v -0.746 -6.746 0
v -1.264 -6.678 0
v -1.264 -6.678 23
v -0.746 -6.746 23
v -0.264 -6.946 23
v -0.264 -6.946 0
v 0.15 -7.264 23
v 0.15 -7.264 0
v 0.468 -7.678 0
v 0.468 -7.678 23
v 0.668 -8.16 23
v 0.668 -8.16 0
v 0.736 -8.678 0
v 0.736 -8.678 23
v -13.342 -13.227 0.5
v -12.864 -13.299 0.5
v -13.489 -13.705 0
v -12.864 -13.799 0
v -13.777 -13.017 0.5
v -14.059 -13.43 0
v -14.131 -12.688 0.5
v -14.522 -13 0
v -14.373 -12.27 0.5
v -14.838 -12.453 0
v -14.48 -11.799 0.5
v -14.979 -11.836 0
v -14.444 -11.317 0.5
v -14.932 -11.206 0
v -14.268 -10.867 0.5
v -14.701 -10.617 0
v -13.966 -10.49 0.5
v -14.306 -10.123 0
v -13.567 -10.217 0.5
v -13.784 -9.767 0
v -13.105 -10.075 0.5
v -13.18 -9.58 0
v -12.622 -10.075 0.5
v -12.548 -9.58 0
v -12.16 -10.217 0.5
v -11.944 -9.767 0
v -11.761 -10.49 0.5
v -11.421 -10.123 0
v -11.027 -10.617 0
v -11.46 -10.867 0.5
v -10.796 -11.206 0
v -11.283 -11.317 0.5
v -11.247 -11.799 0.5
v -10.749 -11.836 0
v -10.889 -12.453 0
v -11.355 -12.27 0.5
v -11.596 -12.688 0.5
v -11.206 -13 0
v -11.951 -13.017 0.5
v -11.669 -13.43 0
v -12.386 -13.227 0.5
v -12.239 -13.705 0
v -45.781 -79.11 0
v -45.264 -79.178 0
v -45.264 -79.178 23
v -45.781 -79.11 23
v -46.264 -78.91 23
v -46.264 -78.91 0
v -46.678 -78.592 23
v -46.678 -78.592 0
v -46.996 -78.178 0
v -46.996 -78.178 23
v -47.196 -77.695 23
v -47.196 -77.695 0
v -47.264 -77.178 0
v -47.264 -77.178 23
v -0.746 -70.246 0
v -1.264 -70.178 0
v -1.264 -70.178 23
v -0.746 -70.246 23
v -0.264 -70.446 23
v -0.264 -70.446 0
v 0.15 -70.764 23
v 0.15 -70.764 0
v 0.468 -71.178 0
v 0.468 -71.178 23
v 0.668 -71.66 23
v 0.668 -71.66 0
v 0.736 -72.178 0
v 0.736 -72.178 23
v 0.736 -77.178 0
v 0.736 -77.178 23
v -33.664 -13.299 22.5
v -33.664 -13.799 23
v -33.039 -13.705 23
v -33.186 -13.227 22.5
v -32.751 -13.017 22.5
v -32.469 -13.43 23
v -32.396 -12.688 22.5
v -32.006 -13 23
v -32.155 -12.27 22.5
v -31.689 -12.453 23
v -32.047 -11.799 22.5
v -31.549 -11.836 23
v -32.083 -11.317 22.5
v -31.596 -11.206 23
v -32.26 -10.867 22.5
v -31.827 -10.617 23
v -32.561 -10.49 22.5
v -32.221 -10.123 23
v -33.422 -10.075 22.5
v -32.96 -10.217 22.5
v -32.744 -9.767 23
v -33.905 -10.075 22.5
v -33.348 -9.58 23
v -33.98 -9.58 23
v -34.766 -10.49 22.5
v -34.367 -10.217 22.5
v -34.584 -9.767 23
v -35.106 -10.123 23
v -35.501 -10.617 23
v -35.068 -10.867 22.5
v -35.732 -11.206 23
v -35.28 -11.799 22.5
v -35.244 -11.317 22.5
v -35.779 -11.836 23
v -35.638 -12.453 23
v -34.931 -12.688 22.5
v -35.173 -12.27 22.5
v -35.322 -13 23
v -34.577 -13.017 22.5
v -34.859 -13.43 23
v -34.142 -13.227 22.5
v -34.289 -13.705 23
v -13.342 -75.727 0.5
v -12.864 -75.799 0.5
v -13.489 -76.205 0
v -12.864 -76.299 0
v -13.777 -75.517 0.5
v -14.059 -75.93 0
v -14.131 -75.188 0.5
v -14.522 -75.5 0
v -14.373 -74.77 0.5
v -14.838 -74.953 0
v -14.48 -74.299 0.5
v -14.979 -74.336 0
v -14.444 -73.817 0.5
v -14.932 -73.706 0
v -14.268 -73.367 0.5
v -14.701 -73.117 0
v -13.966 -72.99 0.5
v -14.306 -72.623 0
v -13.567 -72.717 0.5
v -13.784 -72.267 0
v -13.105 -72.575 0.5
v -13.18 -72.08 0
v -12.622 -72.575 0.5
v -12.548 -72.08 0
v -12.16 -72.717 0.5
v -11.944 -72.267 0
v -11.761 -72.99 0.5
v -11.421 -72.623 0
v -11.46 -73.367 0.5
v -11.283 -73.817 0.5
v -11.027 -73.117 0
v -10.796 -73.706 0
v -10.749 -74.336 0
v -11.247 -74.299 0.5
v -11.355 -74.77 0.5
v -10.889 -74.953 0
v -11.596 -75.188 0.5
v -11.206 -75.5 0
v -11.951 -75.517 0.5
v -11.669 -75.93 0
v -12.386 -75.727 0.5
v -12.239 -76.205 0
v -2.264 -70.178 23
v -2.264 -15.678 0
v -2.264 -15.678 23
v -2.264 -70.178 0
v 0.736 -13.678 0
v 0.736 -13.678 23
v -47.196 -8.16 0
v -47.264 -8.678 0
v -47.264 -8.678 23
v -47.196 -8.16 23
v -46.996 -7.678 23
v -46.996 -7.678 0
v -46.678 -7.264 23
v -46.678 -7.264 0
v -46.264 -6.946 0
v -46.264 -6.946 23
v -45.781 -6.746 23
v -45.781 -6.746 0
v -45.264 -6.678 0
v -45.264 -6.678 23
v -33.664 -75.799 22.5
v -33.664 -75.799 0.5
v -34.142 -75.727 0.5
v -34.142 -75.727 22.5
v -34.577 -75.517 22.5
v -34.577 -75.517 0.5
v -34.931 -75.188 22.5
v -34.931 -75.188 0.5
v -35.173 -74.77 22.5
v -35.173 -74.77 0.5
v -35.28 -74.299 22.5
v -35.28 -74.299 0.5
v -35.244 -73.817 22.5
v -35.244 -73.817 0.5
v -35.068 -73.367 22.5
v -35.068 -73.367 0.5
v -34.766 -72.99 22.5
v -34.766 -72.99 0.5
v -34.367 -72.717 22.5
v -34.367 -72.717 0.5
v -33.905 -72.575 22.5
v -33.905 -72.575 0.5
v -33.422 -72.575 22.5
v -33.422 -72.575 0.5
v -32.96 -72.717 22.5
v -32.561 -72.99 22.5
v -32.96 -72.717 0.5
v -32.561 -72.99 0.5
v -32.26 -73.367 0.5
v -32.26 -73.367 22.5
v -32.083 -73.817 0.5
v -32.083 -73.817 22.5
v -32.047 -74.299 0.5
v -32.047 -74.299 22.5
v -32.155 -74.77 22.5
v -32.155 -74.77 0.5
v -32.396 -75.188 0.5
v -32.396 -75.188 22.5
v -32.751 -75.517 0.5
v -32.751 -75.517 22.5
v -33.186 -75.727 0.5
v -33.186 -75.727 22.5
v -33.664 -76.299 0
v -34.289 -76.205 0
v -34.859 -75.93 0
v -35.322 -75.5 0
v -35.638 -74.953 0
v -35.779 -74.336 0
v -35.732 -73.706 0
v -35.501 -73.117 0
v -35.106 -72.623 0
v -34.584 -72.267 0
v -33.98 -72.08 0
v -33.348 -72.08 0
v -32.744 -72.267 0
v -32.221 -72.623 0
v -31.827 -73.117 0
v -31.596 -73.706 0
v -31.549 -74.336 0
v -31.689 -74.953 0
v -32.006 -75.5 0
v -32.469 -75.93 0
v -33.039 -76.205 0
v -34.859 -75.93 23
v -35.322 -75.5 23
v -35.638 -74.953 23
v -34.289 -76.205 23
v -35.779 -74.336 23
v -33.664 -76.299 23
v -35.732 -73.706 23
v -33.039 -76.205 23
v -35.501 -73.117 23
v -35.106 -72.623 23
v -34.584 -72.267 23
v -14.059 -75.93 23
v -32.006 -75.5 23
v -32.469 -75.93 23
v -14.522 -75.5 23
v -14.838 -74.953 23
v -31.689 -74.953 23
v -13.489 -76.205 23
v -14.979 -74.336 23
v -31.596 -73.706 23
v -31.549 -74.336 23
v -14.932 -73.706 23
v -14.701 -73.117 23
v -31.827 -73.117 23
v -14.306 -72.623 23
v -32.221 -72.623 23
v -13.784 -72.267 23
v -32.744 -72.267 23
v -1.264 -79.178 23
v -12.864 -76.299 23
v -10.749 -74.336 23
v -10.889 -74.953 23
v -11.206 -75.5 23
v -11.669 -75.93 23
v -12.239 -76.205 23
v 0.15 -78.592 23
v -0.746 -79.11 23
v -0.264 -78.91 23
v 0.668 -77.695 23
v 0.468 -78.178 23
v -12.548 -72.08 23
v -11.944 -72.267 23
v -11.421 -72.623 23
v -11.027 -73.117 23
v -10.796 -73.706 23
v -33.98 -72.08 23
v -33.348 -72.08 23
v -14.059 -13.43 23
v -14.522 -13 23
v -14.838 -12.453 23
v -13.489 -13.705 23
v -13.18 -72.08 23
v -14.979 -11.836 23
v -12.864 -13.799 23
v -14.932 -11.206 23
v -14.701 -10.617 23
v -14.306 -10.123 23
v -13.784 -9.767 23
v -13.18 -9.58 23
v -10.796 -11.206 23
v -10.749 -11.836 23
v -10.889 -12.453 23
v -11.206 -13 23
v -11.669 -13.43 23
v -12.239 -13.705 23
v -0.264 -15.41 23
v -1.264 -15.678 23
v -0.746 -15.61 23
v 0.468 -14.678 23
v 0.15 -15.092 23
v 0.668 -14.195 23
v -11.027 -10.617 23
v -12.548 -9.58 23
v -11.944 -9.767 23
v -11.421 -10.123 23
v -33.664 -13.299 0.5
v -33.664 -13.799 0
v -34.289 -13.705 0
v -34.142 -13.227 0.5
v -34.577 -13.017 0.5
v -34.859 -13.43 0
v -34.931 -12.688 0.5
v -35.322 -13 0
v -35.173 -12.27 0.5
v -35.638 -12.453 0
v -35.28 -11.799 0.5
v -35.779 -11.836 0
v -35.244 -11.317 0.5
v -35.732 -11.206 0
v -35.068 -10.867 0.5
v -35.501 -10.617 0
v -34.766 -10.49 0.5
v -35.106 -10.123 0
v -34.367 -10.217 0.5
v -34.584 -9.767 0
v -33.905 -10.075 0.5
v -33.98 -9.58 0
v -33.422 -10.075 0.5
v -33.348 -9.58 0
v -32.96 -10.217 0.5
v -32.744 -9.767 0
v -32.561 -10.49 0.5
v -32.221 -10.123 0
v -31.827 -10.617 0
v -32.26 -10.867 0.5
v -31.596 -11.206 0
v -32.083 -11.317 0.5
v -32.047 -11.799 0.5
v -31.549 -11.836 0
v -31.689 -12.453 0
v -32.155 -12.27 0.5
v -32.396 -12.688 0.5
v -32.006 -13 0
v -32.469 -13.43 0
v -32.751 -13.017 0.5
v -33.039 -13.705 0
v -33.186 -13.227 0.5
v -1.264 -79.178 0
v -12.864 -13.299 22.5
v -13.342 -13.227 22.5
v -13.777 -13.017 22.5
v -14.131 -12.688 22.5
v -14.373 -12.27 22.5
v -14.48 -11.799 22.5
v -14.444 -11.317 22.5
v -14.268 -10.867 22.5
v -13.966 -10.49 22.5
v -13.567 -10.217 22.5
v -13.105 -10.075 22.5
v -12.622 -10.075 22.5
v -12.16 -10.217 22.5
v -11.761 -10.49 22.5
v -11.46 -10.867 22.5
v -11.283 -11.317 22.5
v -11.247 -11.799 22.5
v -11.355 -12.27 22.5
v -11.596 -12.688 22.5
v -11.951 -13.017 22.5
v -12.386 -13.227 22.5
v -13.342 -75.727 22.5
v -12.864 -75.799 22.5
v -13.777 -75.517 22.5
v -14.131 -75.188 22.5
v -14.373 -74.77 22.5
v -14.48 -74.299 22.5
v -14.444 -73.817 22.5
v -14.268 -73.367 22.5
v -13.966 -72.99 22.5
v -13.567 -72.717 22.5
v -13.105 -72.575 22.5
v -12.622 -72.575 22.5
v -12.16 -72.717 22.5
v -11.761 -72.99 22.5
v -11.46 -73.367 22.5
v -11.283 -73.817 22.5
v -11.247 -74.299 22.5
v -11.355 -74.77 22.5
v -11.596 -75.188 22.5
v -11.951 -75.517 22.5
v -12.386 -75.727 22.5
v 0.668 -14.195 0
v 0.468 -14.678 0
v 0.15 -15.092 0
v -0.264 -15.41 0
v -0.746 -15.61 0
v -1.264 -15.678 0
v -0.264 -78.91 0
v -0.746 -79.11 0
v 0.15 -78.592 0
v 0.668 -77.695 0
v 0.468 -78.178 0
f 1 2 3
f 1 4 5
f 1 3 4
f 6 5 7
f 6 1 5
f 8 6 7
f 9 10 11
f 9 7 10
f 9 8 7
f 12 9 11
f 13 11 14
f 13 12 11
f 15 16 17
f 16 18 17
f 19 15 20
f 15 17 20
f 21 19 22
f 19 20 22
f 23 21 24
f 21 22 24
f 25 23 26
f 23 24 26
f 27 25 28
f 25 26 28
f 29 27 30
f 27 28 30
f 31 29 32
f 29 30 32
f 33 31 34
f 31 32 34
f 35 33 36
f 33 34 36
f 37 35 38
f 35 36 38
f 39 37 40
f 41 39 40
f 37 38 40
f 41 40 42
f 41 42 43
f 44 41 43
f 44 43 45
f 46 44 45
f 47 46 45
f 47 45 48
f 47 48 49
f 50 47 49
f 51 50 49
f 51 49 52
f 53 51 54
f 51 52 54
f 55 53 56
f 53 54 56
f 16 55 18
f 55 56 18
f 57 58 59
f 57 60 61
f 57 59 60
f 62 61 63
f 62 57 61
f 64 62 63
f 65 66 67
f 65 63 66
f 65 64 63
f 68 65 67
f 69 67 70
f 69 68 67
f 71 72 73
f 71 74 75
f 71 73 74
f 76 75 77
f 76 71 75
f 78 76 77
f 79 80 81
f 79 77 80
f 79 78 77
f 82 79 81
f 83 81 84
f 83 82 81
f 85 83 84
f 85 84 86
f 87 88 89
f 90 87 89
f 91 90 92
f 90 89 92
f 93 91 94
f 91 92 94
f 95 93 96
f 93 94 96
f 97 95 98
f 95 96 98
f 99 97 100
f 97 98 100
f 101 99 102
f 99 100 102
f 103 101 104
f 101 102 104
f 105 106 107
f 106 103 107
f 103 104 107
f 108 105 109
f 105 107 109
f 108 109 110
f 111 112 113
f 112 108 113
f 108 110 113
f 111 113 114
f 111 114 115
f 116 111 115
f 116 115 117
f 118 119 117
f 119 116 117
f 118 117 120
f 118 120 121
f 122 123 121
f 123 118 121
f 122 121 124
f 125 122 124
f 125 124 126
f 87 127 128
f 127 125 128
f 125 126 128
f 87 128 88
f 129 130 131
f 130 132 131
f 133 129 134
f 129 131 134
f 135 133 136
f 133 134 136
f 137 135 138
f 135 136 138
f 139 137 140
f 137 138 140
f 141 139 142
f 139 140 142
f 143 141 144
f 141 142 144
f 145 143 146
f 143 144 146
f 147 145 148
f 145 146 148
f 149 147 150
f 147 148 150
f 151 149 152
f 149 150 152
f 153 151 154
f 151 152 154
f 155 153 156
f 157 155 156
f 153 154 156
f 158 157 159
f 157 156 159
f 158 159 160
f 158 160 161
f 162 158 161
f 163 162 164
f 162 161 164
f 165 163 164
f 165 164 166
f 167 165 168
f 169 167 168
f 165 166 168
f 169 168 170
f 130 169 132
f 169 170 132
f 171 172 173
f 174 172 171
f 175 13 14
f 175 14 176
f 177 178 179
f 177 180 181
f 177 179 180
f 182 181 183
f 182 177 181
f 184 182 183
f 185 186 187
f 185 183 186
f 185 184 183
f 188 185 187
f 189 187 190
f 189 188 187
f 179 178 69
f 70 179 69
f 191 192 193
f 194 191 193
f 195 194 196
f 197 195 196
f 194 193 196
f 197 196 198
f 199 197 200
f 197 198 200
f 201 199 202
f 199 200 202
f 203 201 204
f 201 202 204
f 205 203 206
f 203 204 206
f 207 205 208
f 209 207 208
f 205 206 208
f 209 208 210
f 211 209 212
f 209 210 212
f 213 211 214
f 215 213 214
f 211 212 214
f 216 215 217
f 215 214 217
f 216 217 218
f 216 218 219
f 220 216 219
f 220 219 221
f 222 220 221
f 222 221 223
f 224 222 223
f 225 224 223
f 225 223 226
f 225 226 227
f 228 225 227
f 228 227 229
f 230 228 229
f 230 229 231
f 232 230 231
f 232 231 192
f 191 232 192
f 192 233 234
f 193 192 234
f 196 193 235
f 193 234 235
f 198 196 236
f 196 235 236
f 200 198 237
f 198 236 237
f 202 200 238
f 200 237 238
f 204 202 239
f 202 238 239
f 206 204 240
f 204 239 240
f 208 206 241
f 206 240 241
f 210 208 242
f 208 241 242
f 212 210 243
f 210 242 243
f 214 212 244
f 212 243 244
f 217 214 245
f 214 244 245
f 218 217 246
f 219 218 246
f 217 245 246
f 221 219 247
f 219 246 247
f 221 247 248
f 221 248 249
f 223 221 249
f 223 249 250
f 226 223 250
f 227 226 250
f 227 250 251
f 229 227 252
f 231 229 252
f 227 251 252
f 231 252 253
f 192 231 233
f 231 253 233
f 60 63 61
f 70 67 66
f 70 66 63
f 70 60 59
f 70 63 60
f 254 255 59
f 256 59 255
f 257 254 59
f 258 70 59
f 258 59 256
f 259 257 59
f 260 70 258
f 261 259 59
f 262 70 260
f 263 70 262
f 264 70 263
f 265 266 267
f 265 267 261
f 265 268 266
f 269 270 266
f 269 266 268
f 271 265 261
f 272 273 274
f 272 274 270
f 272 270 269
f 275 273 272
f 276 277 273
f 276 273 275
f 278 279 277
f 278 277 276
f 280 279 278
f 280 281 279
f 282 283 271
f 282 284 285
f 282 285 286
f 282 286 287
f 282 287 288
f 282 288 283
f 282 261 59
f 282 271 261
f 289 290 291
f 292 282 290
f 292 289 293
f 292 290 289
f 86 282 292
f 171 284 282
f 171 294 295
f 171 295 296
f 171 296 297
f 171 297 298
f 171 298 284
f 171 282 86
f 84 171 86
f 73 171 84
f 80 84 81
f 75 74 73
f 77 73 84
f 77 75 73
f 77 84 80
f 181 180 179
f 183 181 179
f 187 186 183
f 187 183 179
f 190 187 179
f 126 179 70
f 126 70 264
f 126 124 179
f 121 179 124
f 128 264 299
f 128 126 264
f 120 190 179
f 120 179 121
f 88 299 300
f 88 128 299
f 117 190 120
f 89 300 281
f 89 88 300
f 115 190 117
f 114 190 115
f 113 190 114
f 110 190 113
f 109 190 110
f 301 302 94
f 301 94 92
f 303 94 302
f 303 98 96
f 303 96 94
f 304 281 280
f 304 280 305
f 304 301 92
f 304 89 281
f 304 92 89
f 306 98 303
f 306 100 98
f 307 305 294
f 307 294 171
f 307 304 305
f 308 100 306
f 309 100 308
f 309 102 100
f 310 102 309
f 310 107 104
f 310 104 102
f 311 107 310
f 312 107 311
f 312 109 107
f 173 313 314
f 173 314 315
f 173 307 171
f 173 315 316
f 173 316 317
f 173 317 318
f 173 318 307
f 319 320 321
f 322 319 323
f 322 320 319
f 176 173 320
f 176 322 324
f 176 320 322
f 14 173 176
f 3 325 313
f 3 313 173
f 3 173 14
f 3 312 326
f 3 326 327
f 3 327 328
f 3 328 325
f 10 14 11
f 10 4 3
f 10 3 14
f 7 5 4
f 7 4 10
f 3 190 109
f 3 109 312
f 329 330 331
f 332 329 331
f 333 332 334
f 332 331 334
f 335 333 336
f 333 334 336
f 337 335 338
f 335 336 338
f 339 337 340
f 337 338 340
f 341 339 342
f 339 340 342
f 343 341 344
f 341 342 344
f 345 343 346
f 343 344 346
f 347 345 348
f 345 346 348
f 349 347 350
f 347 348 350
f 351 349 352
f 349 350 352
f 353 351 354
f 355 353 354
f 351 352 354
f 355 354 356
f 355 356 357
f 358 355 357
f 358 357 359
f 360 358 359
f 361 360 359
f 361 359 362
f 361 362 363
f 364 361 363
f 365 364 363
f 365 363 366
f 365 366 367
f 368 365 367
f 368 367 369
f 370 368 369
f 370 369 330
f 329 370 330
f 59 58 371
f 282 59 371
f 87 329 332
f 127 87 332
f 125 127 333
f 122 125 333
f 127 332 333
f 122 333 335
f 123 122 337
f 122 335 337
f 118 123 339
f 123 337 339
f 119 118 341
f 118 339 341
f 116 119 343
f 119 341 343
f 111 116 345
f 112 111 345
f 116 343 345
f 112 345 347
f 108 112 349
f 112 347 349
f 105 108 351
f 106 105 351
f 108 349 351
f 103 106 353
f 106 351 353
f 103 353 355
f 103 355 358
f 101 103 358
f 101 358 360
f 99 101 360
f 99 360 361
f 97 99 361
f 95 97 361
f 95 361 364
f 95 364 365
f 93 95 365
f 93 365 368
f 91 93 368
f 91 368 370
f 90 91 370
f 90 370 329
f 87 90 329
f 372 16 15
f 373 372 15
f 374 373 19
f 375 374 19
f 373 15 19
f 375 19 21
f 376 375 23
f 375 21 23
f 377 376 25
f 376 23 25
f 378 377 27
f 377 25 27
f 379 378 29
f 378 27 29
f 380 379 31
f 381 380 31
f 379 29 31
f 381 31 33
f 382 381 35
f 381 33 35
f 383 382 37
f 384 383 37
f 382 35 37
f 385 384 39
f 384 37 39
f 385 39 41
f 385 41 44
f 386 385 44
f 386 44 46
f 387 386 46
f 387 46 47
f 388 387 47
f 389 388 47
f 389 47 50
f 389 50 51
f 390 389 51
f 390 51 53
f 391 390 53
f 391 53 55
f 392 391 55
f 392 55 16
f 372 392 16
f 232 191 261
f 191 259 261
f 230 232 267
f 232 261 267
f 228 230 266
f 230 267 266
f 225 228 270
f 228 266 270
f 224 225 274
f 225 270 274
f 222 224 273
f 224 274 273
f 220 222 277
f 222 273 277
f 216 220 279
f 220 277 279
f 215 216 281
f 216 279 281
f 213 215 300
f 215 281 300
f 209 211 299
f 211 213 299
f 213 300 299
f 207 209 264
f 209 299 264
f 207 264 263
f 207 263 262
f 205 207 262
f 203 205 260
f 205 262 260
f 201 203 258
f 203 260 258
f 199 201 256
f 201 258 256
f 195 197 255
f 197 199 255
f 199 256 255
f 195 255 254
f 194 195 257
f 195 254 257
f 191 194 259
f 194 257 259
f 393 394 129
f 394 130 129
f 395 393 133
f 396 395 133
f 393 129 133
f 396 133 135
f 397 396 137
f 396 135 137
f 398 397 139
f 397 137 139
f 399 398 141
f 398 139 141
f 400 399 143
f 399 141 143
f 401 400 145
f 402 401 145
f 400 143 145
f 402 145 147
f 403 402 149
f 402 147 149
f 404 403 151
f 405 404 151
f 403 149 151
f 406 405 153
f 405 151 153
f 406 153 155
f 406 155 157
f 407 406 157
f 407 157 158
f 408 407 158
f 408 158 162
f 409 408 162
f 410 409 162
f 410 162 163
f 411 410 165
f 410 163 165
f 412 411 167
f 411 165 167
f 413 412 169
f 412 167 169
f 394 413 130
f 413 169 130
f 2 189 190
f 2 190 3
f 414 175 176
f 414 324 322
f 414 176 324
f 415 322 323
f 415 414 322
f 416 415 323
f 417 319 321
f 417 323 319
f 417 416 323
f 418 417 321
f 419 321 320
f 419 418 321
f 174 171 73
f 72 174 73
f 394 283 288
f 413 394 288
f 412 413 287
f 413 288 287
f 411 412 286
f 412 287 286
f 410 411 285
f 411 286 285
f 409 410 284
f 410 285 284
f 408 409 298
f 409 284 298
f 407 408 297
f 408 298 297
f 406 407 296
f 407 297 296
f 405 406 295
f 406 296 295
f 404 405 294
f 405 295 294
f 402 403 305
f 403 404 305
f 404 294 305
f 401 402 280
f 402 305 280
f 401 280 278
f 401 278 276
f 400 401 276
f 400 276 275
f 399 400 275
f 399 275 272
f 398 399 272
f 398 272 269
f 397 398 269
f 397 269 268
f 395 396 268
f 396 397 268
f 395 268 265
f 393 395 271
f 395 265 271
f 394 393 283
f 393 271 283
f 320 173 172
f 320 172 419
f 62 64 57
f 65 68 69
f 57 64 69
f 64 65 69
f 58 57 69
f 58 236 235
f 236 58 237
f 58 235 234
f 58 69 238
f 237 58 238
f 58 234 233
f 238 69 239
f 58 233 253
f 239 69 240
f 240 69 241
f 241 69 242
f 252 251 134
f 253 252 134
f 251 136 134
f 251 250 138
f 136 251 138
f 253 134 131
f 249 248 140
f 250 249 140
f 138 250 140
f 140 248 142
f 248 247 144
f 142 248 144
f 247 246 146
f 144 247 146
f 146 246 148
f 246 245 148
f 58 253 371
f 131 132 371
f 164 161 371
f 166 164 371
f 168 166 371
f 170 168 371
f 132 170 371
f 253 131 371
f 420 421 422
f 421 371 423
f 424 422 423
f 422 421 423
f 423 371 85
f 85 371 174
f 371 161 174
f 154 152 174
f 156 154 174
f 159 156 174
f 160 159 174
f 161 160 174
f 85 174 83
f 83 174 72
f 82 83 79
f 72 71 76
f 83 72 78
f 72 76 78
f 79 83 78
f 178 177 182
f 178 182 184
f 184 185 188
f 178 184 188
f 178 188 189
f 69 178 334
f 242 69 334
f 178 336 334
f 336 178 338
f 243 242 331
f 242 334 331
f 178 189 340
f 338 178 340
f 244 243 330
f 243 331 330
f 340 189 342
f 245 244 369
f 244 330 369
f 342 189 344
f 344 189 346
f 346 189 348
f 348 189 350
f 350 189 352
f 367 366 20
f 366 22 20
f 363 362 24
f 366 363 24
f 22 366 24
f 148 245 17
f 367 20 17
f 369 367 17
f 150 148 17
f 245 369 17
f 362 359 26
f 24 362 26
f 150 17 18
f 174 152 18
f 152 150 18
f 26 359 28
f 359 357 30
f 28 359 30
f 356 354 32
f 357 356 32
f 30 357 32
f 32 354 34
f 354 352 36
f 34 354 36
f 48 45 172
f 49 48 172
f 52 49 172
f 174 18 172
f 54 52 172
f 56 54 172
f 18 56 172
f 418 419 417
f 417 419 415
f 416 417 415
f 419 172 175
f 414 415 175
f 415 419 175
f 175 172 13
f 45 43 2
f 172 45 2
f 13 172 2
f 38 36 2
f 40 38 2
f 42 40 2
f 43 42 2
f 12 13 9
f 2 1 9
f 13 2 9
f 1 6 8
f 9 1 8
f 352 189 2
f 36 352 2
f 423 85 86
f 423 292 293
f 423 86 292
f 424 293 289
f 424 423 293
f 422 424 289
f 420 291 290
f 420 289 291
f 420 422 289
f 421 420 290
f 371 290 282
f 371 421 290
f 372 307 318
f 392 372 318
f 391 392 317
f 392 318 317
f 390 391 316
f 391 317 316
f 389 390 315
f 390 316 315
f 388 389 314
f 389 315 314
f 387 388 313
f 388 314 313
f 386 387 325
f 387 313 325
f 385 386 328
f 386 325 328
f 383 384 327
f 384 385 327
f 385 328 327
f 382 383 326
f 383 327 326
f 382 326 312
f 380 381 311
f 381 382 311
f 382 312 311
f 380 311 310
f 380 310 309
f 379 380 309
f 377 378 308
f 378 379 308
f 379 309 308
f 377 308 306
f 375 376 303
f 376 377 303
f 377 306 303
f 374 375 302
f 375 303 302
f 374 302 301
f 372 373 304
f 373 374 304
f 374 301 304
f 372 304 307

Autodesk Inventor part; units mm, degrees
ref_plane "YZ Plane" through (0, 0, 0) normal (1, 0, 0) x (0, 1, 0)
ref_plane "XZ Plane" through (0, 0, 0) normal (0, 1, 0) x (-1, 0, 0)
ref_plane "Work Plane1" through (0, 0, 0) normal (0, 0, 1) x (1, 0, 0)
sketch "Sketch1" plane through (0, 0, 0) normal (0, 0, 1) x (1, 0, 0)
  line L0 (-42.2638, -6.6778) -> (-4.2638, -6.6778) projected
  line L1 (-44.2638, -77.1778) -> (-44.2638, -8.6778) projected
  line L2 (-4.2638, -79.1778) -> (-42.2638, -79.1778) projected
  line L3 (-2.2638, -8.6778) -> (-2.2638, -77.1778) projected
  circle A0 centre (-23.2638, -42.9278) radius 12.6 projected
  circle A1 centre (-7.2638, -42.9278) radius 2 projected
  circle A2 centre (-23.2638, -58.9278) radius 2 projected
  circle A3 centre (-11.9501, -54.2415) radius 1.5 projected
  circle A4 centre (-34.5775, -54.2415) radius 1.5 projected
  circle A5 centre (-11.9501, -31.6141) radius 1.5 projected
  circle A6 centre (-23.2638, -26.9278) radius 2 projected
  circle A7 centre (-34.5775, -31.6141) radius 1.5 projected
  circle A8 centre (-39.2638, -42.9278) radius 2 projected
  arc A9 (-38.6638, -72.0778) -> (-38.6638, -76.2778) centre (-38.6638, -74.1778) ccw projected
  line L4 (-7.8638, -72.0778) -> (-38.6638, -72.0778) projected
  arc A10 (-7.8638, -76.2778) -> (-7.8638, -72.0778) centre (-7.8638, -74.1778) ccw projected
  line L5 (-38.6638, -76.2778) -> (-7.8638, -76.2778) projected
  arc A11 (-7.8638, -13.7778) -> (-7.8638, -9.5778) centre (-7.8638, -11.6778) ccw projected
  line L6 (-38.6638, -13.7778) -> (-7.8638, -13.7778) projected
  arc A12 (-38.6638, -9.5778) -> (-38.6638, -13.7778) centre (-38.6638, -11.6778) ccw projected
  line L7 (-7.8638, -9.5778) -> (-38.6638, -9.5778) projected
  line L8 (30.6247, -21.3479) -> (-25.1038, -35.8635) projected
  arc A13 (-25.1038, -35.8635) -> (-25.1038, -49.9921) centre (-23.2638, -42.9278) ccw projected
  line L9 (-25.1038, -49.9921) -> (30.6247, -64.5078) projected
  arc A14 (30.6247, -64.5078) -> (30.6247, -21.3479) centre (36.2457, -42.9278) ccw projected
  arc A15 (-24.9022, -36.6377) -> (-24.9022, -49.2179) centre (-23.2638, -42.9278) ccw projected
  line L10 (30.8264, -22.122) -> (-24.9022, -36.6377) projected
  arc A16 (30.8264, -63.7336) -> (30.8264, -22.122) centre (36.2457, -42.9278) ccw projected
  line L11 (-24.9022, -49.2179) -> (30.8264, -63.7336) projected
  line L12 (-44.2638, -15.6778) -> (-2.2638, -15.6778)
  line L13 (-2.2638, -70.1778) -> (-44.2638, -70.1778)
  line L14 (-35.2638, -68.1778) -> (-35.2638, -17.6778)
  line L15 (-47.2638, -8.6778) -> (-47.2638, -77.1778)
  line L16 (-45.2638, -6.6778) -> (-4.2638, -6.6778)
  line L17 (-45.2638, -79.1778) -> (-4.2638, -79.1778)
  arc A17 (-45.2638, -6.6778) -> (-47.2638, -8.6778) centre (-45.2638, -8.6778) ccw
  arc A18 (-47.2638, -77.1778) -> (-45.2638, -79.1778) centre (-45.2638, -77.1778) ccw
  arc A19 (-33.2638, -15.6778) -> (-35.2638, -17.6778) centre (-33.2638, -17.6778) ccw
  arc A20 (-35.2638, -68.1778) -> (-33.2638, -70.1778) centre (-33.2638, -68.1778) ccw
  line L18 (0.7362, -72.1778) -> (0.7362, -77.1778)
  line L19 (0.7362, -8.6778) -> (0.7362, -13.6778)
  line L20 (-2.2638, -15.6778) -> (-1.2638, -15.6778)
  line L21 (-4.2638, -6.6778) -> (-1.2638, -6.6778)
  line L22 (-2.2638, -70.1778) -> (-1.2638, -70.1778)
  line L23 (-4.2638, -79.1778) -> (-1.2638, -79.1778)
  arc A21 (0.7362, -8.6778) -> (-1.2638, -6.6778) centre (-1.2638, -8.6778) ccw
  arc A22 (-1.2638, -15.6778) -> (0.7362, -13.6778) centre (-1.2638, -13.6778) ccw
  arc A23 (0.7362, -72.1778) -> (-1.2638, -70.1778) centre (-1.2638, -72.1778) ccw
  arc A24 (-1.2638, -79.1778) -> (0.7362, -77.1778) centre (-1.2638, -77.1778) ccw
  line L24 (-44.2638, -70.1778) -> (-44.2638, -15.6778)
  arc A25 (-2.2638, -8.6778) -> (-4.2638, -6.6778) centre (-4.2638, -8.6778) ccw projected
  arc A26 (-42.2638, -6.6778) -> (-44.2638, -8.6778) centre (-42.2638, -8.6778) ccw projected
  arc A27 (-44.2638, -77.1778) -> (-42.2638, -79.1778) centre (-42.2638, -77.1778) ccw projected
  arc A28 (-4.2638, -79.1778) -> (-2.2638, -77.1778) centre (-4.2638, -77.1778) ccw projected
  point P0 (0, 0)
  point P1 (-35.2638, -15.6778)
  point P2 (-35.2638, -70.1778)
  point P3 (-12.8638, -11.6778)
  point P4 (-33.6638, -11.6778)
  point P5 (-33.6638, -74.1778)
  point P6 (-12.8638, -74.1778)
  point P7 (-35.2638, -55.5753)
  point P8 (-35.2638, -52.9077)
  point P9 (-35.2638, -46.7697)
  point P10 (-35.2638, -39.0859)
  point P11 (-35.2638, -32.9479)
  point P12 (-35.2638, -30.2803)
  point P13 (-47.2638, -6.6778)
  point P14 (-47.2638, -79.1778)
  point P15 (0.7362, -70.1778)
  point P16 (0.7362, -79.1778)
  point P17 (0.7362, -6.6778)
  point P18 (0.7362, -15.6778)
  point P19 (-42.2638, -6.6778)
  dimension "d0" = 9
  dimension "d1" = 9
  dimension "d2" = 9
  dimension "d3" = 5
  dimension "d4" = 5
  dimension "d5" = 5
  dimension "d6" = 5
  dimension "d9" = 3
  dimension "d12" = 3
  dimension "d13" = 3
extrude "Extrusion1" add sketch "Sketch1" along normal blind 23 contours A26 L1 A27 L17 A18 L15 A17 L16 | L0 A25 L3 L12 L1 A26 | L21 A21 L19 A22 L20 L3 A25 | L12 A19 L14 A7 A0 A4 A20 L13 L1 | L3 L8 A5 A0 L14 A7 A19 L12 | L13 L3 A28 L2 A27 L1 | L3 L10 A0 L8 A5 | A20 L14 A4 A0 L9 A3 L3 L13 | L3 L11 A0 L10 | L8 A5 | A5 L8 | L22 A23 L18 A24 L23 A28 L3 | L14 A7 | A7 L14 | L3 L9 A3 A0 L11 | L10 A15 L11 A0 L9 A13 L8 | A0 L11 A15 L10 | L14 A4 | A4 L14 | L8 A13 L9 A0 L14 | L9 A3 | A3 L9 | L14 A0 | A1 | A2 | A6 | A8 | L4 A10 L5 A9 | L6 A12 L7 A11
sketch "Sketch2" plane through (0, 0, 23) normal (0, 0, 1) x (1, 0, 0)
  arc A0 (-1.2638, -15.6778) -> (0.7362, -13.6778) centre (-1.2638, -13.6778) ccw projected
  line L0 (0.7362, -13.6778) -> (0.7362, -8.6778) projected
  arc A1 (0.7362, -8.6778) -> (-1.2638, -6.6778) centre (-1.2638, -8.6778) ccw projected
  arc A2 (-45.2638, -6.6778) -> (-47.2638, -8.6778) centre (-45.2638, -8.6778) ccw projected
  line L1 (-47.2638, -8.6778) -> (-47.2638, -77.1778) projected
  arc A3 (-47.2638, -77.1778) -> (-45.2638, -79.1778) centre (-45.2638, -77.1778) ccw projected
  arc A4 (-1.2638, -79.1778) -> (0.7362, -77.1778) centre (-1.2638, -77.1778) ccw projected
  line L2 (0.7362, -77.1778) -> (0.7362, -72.1778) projected
  arc A5 (0.7362, -72.1778) -> (-1.2638, -70.1778) centre (-1.2638, -72.1778) ccw projected
  line L3 (-1.2638, -70.1778) -> (-2.2638, -70.1778) projected
  line L4 (-2.2638, -15.6778) -> (-1.2638, -15.6778) projected
  line L5 (-2.2638, -70.1778) -> (-2.2638, -15.6778) projected
  line L6 (-1.2638, -6.6778) -> (-45.2638, -6.6778) projected
  line L7 (-45.2638, -79.1778) -> (-1.2638, -79.1778) projected
  point P0 (0, 0)
  point P1 (-12.8638, -11.6778)
  point P2 (-33.6638, -11.6778)
  point P3 (-33.6638, -74.1778)
  point P4 (-12.8638, -74.1778)
hole "Hole1" at (-12.8638, -11.6778, 23) at (-33.6638, -11.6778, 23) at (-33.6638, -74.1778, 23) at (-12.8638, -74.1778, 23) direction (0, 0, -1) diameter 3.242 end through all thread size "M4x0.7" class "6H" standard "ISO Metric profile"
chamfer "Chamfer1" distance 0.5 angle 45 8 edges at (-33.6638, -72.5568, 23) (-12.8638, -72.5568, 23) (-33.6638, -10.0568, 23) (-12.8638, -10.0568, 23) (-33.6638, -72.5568, 0) (-12.8638, -72.5568, 0) (-33.6638, -10.0568, 0) (-12.8638, -10.0568, 0)
equation "\"d1\" = d2"
equation "\"d2\" = d0"
equation "\"d4\" = d3"
equation "\"d5\" = d4"
equation "\"d6\" = d5"
equation "\"d12\" = d9"
equation "\"d13\" = d12"
properties part number "hoefijzer"
